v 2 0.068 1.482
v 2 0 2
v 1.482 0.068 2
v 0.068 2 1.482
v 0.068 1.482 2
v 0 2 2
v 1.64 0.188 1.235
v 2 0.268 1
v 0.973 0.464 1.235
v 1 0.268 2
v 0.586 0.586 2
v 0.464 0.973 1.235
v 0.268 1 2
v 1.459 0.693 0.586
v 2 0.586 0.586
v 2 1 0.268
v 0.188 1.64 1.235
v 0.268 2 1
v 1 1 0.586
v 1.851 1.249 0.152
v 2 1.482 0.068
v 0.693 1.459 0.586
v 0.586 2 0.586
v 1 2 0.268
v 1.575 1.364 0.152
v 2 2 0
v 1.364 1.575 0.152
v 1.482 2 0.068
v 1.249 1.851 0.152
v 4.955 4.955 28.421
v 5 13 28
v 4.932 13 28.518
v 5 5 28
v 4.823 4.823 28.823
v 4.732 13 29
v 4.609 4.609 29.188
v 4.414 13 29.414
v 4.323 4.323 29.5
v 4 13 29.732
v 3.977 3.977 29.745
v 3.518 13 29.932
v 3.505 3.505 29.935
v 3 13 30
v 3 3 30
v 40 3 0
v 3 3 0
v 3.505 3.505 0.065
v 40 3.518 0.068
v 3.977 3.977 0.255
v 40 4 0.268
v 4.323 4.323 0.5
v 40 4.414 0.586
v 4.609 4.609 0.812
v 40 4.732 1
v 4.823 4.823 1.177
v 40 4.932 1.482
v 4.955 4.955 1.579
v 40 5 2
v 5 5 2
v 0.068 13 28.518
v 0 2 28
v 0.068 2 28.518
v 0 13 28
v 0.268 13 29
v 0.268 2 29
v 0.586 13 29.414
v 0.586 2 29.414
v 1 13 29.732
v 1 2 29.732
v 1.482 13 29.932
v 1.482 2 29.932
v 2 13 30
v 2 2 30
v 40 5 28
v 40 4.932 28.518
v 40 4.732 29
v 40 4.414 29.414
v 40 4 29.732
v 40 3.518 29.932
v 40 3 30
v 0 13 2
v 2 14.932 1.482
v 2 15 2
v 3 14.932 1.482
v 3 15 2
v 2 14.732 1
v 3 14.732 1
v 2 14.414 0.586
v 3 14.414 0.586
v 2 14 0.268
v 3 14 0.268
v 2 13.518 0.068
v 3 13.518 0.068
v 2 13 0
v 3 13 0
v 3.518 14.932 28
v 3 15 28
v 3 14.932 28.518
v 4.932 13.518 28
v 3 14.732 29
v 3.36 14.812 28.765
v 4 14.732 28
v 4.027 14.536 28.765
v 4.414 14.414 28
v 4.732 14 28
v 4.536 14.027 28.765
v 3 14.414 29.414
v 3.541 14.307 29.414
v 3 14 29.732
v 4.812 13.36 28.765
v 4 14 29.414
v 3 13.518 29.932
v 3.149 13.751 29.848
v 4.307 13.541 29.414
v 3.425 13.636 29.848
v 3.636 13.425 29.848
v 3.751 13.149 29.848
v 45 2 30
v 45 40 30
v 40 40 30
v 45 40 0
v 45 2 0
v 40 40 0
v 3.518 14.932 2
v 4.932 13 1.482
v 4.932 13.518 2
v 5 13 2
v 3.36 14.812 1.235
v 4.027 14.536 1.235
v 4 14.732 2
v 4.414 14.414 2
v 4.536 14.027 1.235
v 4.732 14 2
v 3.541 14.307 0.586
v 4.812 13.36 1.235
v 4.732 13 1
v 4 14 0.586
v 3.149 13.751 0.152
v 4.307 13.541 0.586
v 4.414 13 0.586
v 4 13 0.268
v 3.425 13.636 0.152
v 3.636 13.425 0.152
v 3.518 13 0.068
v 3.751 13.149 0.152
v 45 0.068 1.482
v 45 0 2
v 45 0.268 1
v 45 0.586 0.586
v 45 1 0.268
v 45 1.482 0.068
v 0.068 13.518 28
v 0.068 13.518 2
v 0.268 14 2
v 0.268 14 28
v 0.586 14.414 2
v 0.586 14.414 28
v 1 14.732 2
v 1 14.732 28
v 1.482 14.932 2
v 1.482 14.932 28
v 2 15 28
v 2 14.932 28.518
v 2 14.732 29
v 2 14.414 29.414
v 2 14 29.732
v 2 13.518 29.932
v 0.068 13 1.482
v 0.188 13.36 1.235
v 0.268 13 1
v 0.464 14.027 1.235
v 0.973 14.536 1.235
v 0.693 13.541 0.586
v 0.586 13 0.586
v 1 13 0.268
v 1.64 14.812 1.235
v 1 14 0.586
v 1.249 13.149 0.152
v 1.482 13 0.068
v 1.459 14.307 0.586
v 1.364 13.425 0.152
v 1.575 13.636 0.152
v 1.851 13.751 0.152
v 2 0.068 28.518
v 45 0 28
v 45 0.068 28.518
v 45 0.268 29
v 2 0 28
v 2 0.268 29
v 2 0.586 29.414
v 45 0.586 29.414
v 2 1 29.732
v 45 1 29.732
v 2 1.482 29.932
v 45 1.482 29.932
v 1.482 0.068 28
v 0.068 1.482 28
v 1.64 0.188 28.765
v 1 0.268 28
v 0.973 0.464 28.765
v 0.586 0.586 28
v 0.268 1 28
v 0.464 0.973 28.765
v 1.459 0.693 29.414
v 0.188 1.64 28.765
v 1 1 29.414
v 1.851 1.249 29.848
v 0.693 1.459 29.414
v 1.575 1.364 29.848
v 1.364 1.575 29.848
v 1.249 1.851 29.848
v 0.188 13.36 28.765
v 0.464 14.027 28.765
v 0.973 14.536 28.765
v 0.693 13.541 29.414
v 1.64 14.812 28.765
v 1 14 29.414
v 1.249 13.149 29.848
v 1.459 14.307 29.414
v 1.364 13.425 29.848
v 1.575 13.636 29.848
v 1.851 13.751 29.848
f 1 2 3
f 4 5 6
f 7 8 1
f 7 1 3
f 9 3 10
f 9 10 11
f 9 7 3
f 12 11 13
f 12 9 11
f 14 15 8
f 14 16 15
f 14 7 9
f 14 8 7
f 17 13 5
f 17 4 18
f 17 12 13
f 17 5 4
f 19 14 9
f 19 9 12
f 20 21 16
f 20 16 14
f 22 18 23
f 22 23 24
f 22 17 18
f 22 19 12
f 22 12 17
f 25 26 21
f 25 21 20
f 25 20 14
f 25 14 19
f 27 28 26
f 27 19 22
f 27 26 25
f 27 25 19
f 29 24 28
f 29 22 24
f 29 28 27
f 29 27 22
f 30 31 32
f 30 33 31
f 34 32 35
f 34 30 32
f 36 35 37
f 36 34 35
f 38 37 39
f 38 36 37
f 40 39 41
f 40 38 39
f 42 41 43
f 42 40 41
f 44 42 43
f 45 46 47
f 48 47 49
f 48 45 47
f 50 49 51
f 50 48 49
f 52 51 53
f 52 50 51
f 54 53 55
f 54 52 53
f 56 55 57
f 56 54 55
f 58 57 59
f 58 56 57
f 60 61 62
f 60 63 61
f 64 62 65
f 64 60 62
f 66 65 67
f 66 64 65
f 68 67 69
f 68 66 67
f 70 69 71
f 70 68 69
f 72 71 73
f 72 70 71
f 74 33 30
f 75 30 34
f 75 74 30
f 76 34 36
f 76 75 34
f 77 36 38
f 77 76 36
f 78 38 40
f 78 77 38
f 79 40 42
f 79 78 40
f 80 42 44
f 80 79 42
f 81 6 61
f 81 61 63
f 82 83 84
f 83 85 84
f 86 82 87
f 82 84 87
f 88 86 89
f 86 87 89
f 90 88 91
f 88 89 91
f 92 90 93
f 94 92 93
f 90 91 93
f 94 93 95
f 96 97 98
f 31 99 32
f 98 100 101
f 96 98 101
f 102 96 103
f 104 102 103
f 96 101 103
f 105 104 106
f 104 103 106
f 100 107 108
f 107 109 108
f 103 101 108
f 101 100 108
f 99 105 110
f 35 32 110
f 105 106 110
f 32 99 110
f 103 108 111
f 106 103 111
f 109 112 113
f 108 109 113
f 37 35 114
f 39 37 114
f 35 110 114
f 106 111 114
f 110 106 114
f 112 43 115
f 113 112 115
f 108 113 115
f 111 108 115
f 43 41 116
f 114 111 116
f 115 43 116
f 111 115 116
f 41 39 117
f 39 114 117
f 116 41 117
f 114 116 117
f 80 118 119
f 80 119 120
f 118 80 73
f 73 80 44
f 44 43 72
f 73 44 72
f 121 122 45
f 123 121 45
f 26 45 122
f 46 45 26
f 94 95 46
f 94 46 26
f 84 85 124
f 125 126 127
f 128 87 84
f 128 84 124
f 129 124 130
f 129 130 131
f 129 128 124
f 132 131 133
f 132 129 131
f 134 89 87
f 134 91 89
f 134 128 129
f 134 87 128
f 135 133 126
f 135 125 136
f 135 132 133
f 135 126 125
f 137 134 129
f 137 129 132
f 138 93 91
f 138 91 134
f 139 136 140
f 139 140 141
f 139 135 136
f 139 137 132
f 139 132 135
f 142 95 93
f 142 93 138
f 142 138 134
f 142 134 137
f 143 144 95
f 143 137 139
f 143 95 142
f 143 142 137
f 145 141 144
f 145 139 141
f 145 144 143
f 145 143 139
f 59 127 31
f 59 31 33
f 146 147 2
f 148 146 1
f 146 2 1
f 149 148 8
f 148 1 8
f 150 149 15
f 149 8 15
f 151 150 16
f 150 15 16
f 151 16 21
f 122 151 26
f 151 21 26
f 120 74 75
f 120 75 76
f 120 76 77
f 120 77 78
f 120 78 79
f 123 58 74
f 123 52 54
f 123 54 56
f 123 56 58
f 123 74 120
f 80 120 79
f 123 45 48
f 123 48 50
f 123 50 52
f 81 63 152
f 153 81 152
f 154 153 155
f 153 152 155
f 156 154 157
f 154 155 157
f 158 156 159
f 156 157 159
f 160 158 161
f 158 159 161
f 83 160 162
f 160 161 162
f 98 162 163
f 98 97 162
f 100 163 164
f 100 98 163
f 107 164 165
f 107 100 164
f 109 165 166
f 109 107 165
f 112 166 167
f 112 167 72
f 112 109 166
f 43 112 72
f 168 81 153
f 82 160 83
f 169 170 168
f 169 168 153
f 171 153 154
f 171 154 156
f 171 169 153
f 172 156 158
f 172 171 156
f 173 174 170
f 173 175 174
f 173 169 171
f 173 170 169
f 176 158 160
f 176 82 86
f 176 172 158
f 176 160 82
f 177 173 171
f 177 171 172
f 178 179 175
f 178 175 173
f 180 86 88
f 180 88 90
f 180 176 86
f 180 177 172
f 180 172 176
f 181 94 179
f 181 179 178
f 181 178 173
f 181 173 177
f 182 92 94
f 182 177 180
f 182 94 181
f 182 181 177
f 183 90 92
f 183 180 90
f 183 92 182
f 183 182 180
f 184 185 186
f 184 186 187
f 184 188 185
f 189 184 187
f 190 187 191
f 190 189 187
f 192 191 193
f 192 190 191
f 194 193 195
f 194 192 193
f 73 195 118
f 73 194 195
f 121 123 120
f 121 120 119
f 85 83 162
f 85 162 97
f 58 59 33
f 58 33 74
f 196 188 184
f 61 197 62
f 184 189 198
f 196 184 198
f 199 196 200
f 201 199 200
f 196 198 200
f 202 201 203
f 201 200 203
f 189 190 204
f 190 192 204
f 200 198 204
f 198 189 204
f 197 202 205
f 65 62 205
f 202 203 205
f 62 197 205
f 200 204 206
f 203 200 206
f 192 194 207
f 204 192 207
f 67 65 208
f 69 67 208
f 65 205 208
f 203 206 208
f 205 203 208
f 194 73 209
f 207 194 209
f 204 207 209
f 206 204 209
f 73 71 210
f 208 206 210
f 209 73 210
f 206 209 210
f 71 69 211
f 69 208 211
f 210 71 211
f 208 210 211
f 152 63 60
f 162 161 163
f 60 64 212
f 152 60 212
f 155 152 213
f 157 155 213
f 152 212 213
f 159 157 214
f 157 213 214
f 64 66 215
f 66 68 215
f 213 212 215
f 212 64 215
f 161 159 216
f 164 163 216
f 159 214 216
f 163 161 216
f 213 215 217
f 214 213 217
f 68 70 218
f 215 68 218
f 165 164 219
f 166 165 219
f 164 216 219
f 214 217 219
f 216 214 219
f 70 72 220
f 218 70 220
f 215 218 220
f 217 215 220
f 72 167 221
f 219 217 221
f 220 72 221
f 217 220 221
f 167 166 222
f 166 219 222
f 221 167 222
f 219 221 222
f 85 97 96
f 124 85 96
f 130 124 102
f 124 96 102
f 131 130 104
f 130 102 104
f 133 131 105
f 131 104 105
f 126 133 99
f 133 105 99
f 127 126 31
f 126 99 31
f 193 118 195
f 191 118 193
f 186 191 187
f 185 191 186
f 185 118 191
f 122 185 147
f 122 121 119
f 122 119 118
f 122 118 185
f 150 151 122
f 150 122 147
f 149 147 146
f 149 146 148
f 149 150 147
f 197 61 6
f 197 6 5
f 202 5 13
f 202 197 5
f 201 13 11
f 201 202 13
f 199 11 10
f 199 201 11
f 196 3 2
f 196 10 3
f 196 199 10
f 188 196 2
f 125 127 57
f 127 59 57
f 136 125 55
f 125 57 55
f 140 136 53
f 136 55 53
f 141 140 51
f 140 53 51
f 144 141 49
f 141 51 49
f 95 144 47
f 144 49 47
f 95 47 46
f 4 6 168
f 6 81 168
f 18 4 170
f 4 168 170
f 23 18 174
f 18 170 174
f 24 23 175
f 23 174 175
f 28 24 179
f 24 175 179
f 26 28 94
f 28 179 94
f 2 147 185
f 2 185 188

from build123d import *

# Parameters (mm, degrees)
PAD_DEPTH   = 30
FILLET_R    = 2
FILLET001_R = 2
FILLET002_R = 2
FILLET003_R = 2
FILLET004_R = 2
FILLET005_R = 2
FILLET006_R = 2


with BuildPart() as part:
    # Sketch → Pad (new body)
    with BuildSketch(Plane.XY):
        Polygon((45, 40), (45, 0), (0, 0), (0, 15), (5, 15), (5, 5), (40, 5), (40, 40), align=None)
    extrude(amount=PAD_DEPTH)

    # Fillet
    fillet_edges = [part.edges().sort_by_distance(p)[0] for p in [
        (0, 15, 15),
    ]]
    fillet(fillet_edges, radius=FILLET_R)

    # Fillet001
    fillet001_edges = [part.edges().sort_by_distance(p)[0] for p in [
        (5, 15, 15),
    ]]
    fillet(fillet001_edges, radius=FILLET001_R)

    # Fillet002
    fillet002_edges = [part.edges().sort_by_distance(p)[0] for p in [
        (0, 0, 15),
    ]]
    fillet(fillet002_edges, radius=FILLET002_R)

    # Fillet003
    fillet003_edges = [part.edges().sort_by_distance(p)[0] for p in [
        (22.5, 5, 30),
    ]]
    fillet(fillet003_edges, radius=FILLET003_R)

    # Fillet004
    fillet004_edges = [part.edges().sort_by_distance(p)[0] for p in [
        (22.5, 5, 0),
    ]]
    fillet(fillet004_edges, radius=FILLET004_R)

    # Fillet005
    fillet005_edges = [part.edges().sort_by_distance(p)[0] for p in [
        (5, 9, 30),
    ]]
    fillet(fillet005_edges, radius=FILLET005_R)

    # Fillet006
    fillet006_edges = [part.edges().sort_by_distance(p)[0] for p in [
        (0, 7.5, 0),
    ]]
    fillet(fillet006_edges, radius=FILLET006_R)


solid = part.part
